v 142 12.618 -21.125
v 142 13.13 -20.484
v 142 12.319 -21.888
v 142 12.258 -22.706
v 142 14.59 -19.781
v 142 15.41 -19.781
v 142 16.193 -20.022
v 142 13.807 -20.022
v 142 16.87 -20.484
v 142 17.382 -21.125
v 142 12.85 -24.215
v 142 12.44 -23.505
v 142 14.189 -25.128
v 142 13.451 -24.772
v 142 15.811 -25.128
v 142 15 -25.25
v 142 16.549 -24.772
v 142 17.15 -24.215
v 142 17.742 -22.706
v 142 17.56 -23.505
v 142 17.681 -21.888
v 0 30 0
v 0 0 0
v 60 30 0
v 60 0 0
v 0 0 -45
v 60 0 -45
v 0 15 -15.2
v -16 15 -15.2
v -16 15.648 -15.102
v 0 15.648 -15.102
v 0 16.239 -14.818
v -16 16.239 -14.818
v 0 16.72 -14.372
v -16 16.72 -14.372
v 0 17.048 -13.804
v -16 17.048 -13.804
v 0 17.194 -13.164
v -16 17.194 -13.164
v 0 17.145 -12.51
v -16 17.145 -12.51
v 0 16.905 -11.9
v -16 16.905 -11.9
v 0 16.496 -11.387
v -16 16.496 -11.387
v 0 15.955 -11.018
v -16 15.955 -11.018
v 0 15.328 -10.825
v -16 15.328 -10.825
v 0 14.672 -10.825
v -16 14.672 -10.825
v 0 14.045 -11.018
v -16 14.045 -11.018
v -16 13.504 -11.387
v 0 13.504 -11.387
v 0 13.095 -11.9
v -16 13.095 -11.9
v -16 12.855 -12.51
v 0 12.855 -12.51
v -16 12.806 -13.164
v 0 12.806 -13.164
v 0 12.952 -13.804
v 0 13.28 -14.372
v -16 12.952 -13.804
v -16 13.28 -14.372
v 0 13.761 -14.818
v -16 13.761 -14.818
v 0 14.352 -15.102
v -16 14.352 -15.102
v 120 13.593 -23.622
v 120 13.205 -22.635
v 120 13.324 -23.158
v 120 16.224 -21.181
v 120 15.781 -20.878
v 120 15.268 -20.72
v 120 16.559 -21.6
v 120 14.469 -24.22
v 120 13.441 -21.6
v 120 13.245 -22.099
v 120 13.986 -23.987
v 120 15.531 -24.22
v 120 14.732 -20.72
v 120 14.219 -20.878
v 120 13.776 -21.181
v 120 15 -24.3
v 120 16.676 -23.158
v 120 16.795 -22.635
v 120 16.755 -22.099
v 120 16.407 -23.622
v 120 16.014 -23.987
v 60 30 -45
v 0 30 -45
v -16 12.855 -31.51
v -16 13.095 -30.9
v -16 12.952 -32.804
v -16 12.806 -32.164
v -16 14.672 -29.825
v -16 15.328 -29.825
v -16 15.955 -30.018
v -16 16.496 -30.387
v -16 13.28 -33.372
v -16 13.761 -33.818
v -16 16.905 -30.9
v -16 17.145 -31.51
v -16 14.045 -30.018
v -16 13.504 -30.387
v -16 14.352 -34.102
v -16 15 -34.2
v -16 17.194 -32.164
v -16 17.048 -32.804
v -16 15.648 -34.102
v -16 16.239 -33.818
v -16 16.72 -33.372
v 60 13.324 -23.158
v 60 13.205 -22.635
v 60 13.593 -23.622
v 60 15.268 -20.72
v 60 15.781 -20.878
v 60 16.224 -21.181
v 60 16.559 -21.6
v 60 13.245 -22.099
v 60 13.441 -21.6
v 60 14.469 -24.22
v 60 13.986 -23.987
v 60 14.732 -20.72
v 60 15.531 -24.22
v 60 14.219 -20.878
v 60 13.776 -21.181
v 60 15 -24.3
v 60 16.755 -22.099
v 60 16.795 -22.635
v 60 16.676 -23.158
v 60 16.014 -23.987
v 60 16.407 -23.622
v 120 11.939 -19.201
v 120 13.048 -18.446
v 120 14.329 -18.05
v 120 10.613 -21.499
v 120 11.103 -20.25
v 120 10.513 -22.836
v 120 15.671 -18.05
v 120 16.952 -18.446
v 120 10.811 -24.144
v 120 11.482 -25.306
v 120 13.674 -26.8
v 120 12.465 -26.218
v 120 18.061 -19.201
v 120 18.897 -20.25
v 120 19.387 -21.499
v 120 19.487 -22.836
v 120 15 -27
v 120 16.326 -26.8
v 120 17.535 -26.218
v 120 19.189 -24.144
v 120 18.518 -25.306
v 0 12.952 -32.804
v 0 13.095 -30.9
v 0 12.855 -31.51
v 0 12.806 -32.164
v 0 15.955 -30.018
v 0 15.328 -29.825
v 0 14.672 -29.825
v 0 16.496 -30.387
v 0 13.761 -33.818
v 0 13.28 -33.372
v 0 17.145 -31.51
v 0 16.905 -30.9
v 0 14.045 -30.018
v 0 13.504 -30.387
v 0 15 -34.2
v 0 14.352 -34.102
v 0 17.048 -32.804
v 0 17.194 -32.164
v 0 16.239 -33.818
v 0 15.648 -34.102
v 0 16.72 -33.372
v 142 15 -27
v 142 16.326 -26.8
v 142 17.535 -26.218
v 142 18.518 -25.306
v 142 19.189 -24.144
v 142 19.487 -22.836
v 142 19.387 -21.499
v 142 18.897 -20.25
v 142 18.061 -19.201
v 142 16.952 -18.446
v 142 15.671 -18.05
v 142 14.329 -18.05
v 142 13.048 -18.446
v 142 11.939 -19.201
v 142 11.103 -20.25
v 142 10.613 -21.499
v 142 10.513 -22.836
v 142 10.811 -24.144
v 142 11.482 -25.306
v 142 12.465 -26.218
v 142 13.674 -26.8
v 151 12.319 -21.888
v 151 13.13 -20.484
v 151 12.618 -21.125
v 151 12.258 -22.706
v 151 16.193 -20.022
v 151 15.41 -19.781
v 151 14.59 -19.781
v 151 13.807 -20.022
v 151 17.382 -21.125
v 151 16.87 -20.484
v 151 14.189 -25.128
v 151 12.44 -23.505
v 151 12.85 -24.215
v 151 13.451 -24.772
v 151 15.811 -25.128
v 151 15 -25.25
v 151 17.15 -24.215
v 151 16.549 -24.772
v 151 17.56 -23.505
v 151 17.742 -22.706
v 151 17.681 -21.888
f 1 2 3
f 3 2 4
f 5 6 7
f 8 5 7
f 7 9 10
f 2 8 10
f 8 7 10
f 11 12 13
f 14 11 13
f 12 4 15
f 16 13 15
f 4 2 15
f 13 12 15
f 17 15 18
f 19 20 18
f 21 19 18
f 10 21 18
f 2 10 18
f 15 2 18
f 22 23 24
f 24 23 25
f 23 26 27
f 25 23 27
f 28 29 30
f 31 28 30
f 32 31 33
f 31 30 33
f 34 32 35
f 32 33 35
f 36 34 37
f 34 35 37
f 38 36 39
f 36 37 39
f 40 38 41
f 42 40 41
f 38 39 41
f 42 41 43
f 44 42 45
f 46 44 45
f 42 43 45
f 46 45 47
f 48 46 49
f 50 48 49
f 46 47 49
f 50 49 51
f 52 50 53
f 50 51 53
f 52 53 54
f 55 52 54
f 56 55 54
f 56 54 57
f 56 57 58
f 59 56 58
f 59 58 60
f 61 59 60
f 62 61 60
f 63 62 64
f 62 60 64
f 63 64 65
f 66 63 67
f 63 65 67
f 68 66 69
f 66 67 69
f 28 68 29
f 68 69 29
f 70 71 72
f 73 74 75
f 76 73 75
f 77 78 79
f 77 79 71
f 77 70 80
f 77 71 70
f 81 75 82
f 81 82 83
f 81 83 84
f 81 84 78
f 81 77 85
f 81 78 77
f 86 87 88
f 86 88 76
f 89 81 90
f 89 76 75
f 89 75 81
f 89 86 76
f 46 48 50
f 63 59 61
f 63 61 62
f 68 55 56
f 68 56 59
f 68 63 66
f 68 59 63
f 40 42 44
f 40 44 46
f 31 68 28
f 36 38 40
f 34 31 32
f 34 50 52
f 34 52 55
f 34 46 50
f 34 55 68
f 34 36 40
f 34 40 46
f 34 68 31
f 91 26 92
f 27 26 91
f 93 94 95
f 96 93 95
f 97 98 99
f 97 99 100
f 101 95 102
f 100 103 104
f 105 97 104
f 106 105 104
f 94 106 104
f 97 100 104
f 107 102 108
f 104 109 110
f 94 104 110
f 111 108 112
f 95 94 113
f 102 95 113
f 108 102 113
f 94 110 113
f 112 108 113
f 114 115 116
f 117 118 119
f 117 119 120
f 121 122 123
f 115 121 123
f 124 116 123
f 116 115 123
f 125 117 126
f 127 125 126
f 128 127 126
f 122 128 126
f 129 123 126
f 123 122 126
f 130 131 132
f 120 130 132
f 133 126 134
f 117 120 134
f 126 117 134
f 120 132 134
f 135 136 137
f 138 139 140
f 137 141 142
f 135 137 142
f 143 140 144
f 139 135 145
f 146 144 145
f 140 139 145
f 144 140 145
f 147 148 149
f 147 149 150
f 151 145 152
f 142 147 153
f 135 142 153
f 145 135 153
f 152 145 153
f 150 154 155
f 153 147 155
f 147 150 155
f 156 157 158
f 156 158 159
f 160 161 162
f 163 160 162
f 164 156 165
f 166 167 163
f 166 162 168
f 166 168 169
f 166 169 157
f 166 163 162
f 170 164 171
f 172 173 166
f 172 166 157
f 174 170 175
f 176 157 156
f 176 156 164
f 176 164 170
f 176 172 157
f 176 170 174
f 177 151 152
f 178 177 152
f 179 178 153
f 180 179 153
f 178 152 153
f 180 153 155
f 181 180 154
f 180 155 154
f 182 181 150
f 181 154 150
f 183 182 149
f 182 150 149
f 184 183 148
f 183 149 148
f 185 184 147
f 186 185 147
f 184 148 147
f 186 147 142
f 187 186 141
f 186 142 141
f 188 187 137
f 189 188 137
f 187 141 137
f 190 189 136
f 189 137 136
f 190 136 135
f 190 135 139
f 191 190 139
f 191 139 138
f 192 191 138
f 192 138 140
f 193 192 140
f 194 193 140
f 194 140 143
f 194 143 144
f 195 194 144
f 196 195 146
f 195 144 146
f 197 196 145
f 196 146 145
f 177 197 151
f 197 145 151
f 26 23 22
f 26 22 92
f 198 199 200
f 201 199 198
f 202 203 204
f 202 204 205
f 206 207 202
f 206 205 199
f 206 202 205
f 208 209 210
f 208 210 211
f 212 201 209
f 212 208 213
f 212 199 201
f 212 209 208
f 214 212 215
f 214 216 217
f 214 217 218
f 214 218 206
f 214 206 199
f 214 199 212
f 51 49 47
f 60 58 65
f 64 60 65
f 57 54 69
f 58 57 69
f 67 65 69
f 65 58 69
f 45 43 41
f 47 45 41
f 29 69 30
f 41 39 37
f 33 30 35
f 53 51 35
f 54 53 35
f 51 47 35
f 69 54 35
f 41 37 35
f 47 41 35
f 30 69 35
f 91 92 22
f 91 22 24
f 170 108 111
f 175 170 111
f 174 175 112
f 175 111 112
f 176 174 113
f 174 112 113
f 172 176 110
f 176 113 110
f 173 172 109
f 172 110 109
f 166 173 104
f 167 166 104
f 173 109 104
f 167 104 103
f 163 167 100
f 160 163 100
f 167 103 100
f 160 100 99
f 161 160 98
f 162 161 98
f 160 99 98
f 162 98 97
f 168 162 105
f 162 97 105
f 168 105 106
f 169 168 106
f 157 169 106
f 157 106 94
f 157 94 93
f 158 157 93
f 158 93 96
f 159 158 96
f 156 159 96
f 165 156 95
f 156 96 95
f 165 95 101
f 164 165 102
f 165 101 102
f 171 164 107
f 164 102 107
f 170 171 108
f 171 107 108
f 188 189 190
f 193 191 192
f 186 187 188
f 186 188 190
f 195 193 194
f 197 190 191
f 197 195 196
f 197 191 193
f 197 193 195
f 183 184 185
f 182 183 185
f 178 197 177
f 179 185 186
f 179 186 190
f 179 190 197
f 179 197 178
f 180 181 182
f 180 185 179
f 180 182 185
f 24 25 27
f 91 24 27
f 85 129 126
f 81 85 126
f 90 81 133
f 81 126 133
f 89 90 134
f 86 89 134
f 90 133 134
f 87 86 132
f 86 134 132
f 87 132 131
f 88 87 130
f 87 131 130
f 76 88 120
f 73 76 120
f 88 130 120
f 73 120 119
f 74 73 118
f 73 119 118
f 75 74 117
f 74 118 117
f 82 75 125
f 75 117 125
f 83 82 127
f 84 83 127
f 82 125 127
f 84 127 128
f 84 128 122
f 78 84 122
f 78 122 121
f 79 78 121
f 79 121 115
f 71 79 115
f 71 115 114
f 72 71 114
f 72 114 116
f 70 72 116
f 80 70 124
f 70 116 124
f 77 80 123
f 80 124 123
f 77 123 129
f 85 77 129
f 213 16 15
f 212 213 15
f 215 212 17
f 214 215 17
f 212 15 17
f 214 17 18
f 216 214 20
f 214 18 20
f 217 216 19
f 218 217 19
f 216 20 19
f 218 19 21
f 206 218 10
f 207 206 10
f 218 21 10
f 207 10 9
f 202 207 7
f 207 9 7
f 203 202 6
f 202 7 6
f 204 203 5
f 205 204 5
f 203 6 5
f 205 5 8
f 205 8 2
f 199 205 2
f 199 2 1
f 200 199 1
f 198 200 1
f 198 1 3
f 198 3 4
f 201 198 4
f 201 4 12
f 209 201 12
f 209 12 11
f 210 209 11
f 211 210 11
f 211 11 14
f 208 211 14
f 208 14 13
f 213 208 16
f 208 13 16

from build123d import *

# Parameters (mm, degrees)
SK_ADAPTER_BODY_W  = 60
SK_ADAPTER_BODY_H  = 45
ADAPTER_BODY_DEPTH = 30
MAINS_START        = -16
SK_MAINS_PINS_R    = 2.2
MAINS_PINS_DEPTH   = 16
MAINS_PINS_2_DEPTH = 16
DC_START           = 60
SK_DC_LEAD_R       = 1.8
DC_LEAD_DEPTH      = 60
BARREL_START       = 120
SK_BARREL_PLUG_R   = 4.5
BARREL_PLUG_DEPTH  = 22
PLUG_START         = 142
SK_PLUG_TIP_R      = 2.75
PLUG_TIP_DEPTH     = 9


with BuildPart() as part:
    # SK Adapter body → Adapter body (new body)
    with BuildSketch(Plane(origin=(0, 0, 0), x_dir=(1, 0, 0), z_dir=(0, 1, 0))):
        with Locations((30, 22.5)):
            Rectangle(SK_ADAPTER_BODY_W, SK_ADAPTER_BODY_H)
    extrude(amount=ADAPTER_BODY_DEPTH)


with BuildPart() as body_2:
    # SK Mains pins → Mains pins (new body)
    with BuildSketch(Plane(origin=(0, 0, 0), x_dir=(0, 0, -1), z_dir=(1, 0, 0)).offset(MAINS_START)):
        with Locations((13, 15)):
            Circle(SK_MAINS_PINS_R)
    extrude(amount=MAINS_PINS_DEPTH)


with BuildPart() as body_3:
    # SK Mains pins → Mains pins 2 (new body)
    with BuildSketch(Plane(origin=(0, 0, 0), x_dir=(0, 0, -1), z_dir=(1, 0, 0)).offset(MAINS_START)):
        with Locations((32, 15)):
            Circle(SK_MAINS_PINS_R)
    extrude(amount=MAINS_PINS_2_DEPTH)


with BuildPart() as body_4:
    # SK DC lead → DC lead (new body)
    with BuildSketch(Plane(origin=(0, 0, 0), x_dir=(0, 0, -1), z_dir=(1, 0, 0)).offset(DC_START)):
        with Locations((22.5, 15)):
            Circle(SK_DC_LEAD_R)
    extrude(amount=DC_LEAD_DEPTH)


with BuildPart() as body_5:
    # SK Barrel plug → Barrel plug (new body)
    with BuildSketch(Plane(origin=(0, 0, 0), x_dir=(0, 0, -1), z_dir=(1, 0, 0)).offset(BARREL_START)):
        with Locations((22.5, 15)):
            Circle(SK_BARREL_PLUG_R)
    extrude(amount=BARREL_PLUG_DEPTH)


with BuildPart() as body_6:
    # SK Plug tip → Plug tip (new body)
    with BuildSketch(Plane(origin=(0, 0, 0), x_dir=(0, 0, -1), z_dir=(1, 0, 0)).offset(PLUG_START)):
        with Locations((22.5, 15)):
            Circle(SK_PLUG_TIP_R)
    extrude(amount=PLUG_TIP_DEPTH)


solid = Compound([part.part, body_2.part, body_3.part, body_4.part, body_5.part, body_6.part])
